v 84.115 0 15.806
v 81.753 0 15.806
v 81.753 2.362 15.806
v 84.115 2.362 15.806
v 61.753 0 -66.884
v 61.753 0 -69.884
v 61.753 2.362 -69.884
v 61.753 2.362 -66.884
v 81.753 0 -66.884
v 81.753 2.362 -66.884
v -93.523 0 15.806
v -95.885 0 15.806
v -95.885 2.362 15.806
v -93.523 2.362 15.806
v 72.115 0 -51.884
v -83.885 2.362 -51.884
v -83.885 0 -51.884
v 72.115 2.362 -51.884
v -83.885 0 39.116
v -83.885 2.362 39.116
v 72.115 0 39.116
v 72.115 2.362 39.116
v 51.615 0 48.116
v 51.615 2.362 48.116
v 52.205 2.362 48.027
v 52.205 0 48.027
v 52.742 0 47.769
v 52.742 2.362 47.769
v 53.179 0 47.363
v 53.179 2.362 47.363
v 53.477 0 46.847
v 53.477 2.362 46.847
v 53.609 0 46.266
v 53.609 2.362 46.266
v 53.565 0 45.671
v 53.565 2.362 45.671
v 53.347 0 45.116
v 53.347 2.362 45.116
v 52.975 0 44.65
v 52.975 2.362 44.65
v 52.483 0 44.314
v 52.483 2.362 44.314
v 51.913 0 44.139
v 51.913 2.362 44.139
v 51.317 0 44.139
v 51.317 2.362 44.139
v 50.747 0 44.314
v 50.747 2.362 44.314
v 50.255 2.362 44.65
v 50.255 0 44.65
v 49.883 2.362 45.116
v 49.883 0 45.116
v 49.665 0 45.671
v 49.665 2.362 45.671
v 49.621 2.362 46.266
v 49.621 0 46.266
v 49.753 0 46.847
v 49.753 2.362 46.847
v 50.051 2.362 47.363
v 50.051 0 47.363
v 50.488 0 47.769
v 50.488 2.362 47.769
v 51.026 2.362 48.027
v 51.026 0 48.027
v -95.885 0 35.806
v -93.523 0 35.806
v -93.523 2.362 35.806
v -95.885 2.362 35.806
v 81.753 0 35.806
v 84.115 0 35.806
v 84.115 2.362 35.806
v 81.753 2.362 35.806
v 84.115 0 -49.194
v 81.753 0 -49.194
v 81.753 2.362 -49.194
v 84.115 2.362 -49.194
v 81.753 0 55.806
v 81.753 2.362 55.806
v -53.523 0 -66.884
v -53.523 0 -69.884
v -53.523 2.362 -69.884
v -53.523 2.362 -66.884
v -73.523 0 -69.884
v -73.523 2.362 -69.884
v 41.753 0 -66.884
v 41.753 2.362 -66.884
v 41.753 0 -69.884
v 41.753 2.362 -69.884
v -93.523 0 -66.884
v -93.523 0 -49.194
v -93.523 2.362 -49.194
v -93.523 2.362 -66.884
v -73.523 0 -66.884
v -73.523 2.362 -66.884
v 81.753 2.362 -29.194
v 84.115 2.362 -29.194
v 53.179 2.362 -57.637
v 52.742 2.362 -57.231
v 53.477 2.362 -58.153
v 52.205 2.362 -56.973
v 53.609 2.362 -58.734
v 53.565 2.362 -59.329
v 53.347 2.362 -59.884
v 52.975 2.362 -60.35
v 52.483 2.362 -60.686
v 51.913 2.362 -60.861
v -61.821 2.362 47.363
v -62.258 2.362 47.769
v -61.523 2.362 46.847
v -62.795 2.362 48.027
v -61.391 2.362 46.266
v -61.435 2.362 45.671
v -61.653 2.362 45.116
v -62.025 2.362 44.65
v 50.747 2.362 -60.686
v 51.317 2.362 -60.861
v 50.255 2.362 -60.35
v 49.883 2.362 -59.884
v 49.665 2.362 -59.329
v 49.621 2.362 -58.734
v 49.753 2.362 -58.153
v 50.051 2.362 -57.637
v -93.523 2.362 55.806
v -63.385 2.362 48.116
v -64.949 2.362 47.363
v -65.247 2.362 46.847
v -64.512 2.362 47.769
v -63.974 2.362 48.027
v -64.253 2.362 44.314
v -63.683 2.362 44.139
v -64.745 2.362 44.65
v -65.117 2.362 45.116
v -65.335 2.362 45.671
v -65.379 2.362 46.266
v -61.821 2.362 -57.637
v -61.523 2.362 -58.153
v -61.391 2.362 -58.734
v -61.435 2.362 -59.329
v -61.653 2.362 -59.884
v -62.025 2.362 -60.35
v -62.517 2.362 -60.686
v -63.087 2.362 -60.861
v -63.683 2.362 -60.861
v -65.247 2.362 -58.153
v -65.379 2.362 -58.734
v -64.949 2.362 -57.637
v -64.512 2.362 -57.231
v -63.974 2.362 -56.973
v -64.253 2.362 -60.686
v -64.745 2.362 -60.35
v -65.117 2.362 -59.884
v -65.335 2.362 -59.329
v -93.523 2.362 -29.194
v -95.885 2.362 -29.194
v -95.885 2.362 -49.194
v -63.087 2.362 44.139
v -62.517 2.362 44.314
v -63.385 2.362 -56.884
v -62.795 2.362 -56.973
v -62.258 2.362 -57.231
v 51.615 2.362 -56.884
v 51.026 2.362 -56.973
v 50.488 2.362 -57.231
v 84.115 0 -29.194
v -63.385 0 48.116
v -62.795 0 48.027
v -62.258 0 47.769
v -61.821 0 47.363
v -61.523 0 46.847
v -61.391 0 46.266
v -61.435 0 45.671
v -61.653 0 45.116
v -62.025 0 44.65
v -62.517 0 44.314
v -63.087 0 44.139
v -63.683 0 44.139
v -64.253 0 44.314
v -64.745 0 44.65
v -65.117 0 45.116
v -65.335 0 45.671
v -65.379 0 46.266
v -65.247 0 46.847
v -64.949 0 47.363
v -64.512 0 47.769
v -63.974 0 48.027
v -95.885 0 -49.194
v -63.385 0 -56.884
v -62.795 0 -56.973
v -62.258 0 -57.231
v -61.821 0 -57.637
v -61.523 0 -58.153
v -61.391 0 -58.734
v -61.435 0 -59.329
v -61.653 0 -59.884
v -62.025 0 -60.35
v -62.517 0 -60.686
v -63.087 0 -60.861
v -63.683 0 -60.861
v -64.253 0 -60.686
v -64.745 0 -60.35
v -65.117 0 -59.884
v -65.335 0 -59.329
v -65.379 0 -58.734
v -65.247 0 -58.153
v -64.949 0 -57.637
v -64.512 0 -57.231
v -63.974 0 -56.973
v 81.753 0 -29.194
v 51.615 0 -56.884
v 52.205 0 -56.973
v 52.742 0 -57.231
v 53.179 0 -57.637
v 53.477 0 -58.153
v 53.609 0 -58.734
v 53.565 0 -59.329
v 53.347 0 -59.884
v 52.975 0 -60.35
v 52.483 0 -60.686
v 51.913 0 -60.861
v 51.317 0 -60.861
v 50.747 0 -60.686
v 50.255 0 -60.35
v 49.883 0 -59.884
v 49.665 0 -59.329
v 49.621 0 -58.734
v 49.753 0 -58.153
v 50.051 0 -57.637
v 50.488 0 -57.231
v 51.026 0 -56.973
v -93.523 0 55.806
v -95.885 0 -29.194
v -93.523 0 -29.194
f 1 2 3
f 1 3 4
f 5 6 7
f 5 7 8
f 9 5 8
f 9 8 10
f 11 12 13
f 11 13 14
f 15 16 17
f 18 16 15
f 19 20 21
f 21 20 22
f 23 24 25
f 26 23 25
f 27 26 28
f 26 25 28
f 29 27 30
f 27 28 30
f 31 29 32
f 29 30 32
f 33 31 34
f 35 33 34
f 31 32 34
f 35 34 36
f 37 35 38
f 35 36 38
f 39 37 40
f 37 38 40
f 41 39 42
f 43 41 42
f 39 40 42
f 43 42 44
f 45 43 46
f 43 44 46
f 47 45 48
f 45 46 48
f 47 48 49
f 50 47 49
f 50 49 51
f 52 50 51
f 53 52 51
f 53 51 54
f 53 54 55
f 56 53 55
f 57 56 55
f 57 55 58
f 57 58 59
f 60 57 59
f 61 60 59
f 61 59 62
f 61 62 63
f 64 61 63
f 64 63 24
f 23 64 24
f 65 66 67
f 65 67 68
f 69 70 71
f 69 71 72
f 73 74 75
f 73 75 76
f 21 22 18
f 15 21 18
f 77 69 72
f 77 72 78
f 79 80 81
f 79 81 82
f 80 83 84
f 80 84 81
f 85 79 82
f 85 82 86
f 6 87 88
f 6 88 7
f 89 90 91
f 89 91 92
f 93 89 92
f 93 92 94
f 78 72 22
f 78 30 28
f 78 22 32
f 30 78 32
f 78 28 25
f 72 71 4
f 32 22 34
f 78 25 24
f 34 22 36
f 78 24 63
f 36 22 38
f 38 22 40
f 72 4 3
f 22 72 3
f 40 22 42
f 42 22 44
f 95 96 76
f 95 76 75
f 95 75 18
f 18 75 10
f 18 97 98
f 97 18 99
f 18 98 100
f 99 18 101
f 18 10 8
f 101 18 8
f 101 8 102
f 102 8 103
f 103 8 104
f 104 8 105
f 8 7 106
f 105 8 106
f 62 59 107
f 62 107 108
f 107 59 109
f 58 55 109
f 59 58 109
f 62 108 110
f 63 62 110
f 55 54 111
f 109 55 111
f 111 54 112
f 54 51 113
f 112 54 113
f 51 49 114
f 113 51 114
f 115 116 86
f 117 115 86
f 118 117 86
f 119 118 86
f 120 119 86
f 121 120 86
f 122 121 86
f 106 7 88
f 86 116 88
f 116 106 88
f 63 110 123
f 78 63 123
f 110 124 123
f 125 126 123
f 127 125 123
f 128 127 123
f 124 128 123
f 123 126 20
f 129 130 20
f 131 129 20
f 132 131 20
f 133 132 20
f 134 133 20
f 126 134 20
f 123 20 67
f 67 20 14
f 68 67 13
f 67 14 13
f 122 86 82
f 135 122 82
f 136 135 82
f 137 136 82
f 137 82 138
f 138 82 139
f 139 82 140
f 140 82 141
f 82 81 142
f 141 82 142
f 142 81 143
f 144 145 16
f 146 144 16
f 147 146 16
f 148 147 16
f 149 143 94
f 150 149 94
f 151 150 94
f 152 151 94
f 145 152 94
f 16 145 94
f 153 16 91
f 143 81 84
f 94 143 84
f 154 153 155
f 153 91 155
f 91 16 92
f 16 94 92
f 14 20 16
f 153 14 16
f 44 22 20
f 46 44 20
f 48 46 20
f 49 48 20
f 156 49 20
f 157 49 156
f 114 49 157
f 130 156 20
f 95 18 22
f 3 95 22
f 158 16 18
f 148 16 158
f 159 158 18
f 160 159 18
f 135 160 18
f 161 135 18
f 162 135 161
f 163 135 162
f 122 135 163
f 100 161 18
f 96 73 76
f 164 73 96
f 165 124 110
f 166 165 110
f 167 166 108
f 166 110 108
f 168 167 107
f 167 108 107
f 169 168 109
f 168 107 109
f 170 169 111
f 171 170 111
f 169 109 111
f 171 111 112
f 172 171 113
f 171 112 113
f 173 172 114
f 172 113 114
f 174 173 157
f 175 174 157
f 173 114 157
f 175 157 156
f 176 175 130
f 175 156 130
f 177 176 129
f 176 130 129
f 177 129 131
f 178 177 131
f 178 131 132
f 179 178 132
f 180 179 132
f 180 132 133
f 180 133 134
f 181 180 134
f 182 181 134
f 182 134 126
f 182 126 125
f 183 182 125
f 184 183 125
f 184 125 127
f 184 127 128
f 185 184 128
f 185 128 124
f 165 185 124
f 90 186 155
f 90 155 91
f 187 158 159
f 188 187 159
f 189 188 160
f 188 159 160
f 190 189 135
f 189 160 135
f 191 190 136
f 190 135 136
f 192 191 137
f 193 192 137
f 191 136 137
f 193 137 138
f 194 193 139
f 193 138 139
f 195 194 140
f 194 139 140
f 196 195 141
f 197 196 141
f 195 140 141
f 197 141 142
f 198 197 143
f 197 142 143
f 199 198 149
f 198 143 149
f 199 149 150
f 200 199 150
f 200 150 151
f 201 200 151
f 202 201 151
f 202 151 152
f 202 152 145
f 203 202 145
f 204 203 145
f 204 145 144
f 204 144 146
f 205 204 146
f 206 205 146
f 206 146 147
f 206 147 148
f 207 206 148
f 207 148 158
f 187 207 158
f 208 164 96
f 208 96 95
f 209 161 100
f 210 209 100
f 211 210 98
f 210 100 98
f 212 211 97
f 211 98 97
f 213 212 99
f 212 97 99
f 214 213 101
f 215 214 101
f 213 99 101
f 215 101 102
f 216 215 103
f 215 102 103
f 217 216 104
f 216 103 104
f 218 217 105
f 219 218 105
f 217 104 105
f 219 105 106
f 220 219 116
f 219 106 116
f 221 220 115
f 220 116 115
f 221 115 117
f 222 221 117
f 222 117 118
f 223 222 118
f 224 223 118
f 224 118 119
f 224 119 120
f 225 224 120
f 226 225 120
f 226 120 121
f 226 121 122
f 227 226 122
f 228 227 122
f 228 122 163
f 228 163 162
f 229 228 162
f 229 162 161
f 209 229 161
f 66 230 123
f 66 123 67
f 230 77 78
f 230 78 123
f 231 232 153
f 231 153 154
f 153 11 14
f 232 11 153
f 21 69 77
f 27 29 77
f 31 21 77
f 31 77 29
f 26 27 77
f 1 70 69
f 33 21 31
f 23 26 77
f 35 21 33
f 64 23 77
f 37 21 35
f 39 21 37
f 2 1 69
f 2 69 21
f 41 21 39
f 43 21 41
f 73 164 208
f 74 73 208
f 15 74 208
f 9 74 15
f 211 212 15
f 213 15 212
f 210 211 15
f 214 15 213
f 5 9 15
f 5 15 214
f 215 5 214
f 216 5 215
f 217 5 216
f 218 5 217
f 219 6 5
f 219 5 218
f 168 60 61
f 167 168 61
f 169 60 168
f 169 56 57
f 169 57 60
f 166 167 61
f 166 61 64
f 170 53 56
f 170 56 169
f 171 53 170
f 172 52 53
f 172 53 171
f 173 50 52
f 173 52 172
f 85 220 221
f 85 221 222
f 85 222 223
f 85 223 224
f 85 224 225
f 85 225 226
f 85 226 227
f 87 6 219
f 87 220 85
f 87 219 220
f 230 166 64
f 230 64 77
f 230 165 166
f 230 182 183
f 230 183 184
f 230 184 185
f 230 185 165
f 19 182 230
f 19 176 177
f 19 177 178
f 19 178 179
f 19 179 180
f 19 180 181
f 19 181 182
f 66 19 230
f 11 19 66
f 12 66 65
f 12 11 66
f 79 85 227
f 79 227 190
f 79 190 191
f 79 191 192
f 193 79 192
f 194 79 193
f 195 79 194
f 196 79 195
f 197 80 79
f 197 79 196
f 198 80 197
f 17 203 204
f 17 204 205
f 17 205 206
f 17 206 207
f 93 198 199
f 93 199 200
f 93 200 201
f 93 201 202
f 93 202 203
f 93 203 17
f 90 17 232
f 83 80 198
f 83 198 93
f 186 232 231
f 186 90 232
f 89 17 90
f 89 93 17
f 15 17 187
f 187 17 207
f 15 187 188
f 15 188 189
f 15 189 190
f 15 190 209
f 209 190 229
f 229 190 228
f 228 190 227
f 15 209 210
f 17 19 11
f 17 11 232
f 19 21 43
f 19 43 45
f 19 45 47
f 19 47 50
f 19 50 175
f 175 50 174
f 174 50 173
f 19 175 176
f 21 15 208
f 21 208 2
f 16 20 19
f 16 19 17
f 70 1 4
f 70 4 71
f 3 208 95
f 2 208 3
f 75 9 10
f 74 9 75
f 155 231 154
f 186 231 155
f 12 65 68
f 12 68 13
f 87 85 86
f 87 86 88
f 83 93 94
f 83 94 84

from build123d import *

# Parameters (mm, degrees)
BOSS_EXTRUDE1_DEPTH = 2.3622
SKETCH2_R           = 2
SKETCH2_W           = 156
SKETCH2_H           = 91
CUT_EXTRUDE1_DEPTH  = 119.672908335


with BuildPart() as part:
    # Sketch1 → Boss-Extrude1 (new body)
    with BuildSketch(Plane(origin=(0, 0, 0), x_dir=(1, 0, 0), z_dir=(0, 1, 0))):
        Polygon((-93.522777066, 66.883834733), (-73.522777066, 66.883834733), (-73.522777066, 69.883834733), (-53.522777066, 69.883834733), (-53.522777066, 66.883834733), (41.752822934, 66.883834733), (41.752822934, 69.883834733), (61.752822934, 69.883834733), (61.752822934, 66.883834733), (81.752822934, 66.883834733), (81.752822934, 49.193834733), (84.115022934, 49.193834733), (84.115022934, 29.193834733), (81.752822934, 29.193834733), (81.752822934, -15.806165267), (84.115022934, -15.806165267), (84.115022934, -35.806165267), (81.752822934, -35.806165267), (81.752822934, -55.806165267), (-93.522777066, -55.806165267), (-93.522777066, -35.806165267), (-95.884977066, -35.806165267), (-95.884977066, -15.806165267), (-93.522777066, -15.806165267), (-93.522777066, 29.193834733), (-95.884977066, 29.193834733), (-95.884977066, 49.193834733), (-93.522777066, 49.193834733), align=None)
    extrude(amount=BOSS_EXTRUDE1_DEPTH)

    # Sketch2 → Cut-Extrude1 (cut, through all)
    with BuildSketch(Plane(origin=(0, 2.3622, 0), x_dir=(1, 0, 0), z_dir=(0, 1, 0))):
        with Locations(Location((-63.384977066, 58.883834733, 0), (0, 0, 270))):
            Circle(SKETCH2_R)
        with Locations(Location((51.615022934, 58.883834733, 0), (0, 0, 270))):
            Circle(SKETCH2_R)
        with Locations(Location((-63.384977066, -46.116165267, 0), (0, 0, 270))):
            Circle(SKETCH2_R)
        with Locations(Location((51.615022934, -46.116165267, 0), (0, 0, 270))):
            Circle(SKETCH2_R)
        with Locations((-5.884977066, 6.383834733)):
            Rectangle(SKETCH2_W, SKETCH2_H)
    extrude(amount=-CUT_EXTRUDE1_DEPTH, mode=Mode.SUBTRACT)


solid = part.part
